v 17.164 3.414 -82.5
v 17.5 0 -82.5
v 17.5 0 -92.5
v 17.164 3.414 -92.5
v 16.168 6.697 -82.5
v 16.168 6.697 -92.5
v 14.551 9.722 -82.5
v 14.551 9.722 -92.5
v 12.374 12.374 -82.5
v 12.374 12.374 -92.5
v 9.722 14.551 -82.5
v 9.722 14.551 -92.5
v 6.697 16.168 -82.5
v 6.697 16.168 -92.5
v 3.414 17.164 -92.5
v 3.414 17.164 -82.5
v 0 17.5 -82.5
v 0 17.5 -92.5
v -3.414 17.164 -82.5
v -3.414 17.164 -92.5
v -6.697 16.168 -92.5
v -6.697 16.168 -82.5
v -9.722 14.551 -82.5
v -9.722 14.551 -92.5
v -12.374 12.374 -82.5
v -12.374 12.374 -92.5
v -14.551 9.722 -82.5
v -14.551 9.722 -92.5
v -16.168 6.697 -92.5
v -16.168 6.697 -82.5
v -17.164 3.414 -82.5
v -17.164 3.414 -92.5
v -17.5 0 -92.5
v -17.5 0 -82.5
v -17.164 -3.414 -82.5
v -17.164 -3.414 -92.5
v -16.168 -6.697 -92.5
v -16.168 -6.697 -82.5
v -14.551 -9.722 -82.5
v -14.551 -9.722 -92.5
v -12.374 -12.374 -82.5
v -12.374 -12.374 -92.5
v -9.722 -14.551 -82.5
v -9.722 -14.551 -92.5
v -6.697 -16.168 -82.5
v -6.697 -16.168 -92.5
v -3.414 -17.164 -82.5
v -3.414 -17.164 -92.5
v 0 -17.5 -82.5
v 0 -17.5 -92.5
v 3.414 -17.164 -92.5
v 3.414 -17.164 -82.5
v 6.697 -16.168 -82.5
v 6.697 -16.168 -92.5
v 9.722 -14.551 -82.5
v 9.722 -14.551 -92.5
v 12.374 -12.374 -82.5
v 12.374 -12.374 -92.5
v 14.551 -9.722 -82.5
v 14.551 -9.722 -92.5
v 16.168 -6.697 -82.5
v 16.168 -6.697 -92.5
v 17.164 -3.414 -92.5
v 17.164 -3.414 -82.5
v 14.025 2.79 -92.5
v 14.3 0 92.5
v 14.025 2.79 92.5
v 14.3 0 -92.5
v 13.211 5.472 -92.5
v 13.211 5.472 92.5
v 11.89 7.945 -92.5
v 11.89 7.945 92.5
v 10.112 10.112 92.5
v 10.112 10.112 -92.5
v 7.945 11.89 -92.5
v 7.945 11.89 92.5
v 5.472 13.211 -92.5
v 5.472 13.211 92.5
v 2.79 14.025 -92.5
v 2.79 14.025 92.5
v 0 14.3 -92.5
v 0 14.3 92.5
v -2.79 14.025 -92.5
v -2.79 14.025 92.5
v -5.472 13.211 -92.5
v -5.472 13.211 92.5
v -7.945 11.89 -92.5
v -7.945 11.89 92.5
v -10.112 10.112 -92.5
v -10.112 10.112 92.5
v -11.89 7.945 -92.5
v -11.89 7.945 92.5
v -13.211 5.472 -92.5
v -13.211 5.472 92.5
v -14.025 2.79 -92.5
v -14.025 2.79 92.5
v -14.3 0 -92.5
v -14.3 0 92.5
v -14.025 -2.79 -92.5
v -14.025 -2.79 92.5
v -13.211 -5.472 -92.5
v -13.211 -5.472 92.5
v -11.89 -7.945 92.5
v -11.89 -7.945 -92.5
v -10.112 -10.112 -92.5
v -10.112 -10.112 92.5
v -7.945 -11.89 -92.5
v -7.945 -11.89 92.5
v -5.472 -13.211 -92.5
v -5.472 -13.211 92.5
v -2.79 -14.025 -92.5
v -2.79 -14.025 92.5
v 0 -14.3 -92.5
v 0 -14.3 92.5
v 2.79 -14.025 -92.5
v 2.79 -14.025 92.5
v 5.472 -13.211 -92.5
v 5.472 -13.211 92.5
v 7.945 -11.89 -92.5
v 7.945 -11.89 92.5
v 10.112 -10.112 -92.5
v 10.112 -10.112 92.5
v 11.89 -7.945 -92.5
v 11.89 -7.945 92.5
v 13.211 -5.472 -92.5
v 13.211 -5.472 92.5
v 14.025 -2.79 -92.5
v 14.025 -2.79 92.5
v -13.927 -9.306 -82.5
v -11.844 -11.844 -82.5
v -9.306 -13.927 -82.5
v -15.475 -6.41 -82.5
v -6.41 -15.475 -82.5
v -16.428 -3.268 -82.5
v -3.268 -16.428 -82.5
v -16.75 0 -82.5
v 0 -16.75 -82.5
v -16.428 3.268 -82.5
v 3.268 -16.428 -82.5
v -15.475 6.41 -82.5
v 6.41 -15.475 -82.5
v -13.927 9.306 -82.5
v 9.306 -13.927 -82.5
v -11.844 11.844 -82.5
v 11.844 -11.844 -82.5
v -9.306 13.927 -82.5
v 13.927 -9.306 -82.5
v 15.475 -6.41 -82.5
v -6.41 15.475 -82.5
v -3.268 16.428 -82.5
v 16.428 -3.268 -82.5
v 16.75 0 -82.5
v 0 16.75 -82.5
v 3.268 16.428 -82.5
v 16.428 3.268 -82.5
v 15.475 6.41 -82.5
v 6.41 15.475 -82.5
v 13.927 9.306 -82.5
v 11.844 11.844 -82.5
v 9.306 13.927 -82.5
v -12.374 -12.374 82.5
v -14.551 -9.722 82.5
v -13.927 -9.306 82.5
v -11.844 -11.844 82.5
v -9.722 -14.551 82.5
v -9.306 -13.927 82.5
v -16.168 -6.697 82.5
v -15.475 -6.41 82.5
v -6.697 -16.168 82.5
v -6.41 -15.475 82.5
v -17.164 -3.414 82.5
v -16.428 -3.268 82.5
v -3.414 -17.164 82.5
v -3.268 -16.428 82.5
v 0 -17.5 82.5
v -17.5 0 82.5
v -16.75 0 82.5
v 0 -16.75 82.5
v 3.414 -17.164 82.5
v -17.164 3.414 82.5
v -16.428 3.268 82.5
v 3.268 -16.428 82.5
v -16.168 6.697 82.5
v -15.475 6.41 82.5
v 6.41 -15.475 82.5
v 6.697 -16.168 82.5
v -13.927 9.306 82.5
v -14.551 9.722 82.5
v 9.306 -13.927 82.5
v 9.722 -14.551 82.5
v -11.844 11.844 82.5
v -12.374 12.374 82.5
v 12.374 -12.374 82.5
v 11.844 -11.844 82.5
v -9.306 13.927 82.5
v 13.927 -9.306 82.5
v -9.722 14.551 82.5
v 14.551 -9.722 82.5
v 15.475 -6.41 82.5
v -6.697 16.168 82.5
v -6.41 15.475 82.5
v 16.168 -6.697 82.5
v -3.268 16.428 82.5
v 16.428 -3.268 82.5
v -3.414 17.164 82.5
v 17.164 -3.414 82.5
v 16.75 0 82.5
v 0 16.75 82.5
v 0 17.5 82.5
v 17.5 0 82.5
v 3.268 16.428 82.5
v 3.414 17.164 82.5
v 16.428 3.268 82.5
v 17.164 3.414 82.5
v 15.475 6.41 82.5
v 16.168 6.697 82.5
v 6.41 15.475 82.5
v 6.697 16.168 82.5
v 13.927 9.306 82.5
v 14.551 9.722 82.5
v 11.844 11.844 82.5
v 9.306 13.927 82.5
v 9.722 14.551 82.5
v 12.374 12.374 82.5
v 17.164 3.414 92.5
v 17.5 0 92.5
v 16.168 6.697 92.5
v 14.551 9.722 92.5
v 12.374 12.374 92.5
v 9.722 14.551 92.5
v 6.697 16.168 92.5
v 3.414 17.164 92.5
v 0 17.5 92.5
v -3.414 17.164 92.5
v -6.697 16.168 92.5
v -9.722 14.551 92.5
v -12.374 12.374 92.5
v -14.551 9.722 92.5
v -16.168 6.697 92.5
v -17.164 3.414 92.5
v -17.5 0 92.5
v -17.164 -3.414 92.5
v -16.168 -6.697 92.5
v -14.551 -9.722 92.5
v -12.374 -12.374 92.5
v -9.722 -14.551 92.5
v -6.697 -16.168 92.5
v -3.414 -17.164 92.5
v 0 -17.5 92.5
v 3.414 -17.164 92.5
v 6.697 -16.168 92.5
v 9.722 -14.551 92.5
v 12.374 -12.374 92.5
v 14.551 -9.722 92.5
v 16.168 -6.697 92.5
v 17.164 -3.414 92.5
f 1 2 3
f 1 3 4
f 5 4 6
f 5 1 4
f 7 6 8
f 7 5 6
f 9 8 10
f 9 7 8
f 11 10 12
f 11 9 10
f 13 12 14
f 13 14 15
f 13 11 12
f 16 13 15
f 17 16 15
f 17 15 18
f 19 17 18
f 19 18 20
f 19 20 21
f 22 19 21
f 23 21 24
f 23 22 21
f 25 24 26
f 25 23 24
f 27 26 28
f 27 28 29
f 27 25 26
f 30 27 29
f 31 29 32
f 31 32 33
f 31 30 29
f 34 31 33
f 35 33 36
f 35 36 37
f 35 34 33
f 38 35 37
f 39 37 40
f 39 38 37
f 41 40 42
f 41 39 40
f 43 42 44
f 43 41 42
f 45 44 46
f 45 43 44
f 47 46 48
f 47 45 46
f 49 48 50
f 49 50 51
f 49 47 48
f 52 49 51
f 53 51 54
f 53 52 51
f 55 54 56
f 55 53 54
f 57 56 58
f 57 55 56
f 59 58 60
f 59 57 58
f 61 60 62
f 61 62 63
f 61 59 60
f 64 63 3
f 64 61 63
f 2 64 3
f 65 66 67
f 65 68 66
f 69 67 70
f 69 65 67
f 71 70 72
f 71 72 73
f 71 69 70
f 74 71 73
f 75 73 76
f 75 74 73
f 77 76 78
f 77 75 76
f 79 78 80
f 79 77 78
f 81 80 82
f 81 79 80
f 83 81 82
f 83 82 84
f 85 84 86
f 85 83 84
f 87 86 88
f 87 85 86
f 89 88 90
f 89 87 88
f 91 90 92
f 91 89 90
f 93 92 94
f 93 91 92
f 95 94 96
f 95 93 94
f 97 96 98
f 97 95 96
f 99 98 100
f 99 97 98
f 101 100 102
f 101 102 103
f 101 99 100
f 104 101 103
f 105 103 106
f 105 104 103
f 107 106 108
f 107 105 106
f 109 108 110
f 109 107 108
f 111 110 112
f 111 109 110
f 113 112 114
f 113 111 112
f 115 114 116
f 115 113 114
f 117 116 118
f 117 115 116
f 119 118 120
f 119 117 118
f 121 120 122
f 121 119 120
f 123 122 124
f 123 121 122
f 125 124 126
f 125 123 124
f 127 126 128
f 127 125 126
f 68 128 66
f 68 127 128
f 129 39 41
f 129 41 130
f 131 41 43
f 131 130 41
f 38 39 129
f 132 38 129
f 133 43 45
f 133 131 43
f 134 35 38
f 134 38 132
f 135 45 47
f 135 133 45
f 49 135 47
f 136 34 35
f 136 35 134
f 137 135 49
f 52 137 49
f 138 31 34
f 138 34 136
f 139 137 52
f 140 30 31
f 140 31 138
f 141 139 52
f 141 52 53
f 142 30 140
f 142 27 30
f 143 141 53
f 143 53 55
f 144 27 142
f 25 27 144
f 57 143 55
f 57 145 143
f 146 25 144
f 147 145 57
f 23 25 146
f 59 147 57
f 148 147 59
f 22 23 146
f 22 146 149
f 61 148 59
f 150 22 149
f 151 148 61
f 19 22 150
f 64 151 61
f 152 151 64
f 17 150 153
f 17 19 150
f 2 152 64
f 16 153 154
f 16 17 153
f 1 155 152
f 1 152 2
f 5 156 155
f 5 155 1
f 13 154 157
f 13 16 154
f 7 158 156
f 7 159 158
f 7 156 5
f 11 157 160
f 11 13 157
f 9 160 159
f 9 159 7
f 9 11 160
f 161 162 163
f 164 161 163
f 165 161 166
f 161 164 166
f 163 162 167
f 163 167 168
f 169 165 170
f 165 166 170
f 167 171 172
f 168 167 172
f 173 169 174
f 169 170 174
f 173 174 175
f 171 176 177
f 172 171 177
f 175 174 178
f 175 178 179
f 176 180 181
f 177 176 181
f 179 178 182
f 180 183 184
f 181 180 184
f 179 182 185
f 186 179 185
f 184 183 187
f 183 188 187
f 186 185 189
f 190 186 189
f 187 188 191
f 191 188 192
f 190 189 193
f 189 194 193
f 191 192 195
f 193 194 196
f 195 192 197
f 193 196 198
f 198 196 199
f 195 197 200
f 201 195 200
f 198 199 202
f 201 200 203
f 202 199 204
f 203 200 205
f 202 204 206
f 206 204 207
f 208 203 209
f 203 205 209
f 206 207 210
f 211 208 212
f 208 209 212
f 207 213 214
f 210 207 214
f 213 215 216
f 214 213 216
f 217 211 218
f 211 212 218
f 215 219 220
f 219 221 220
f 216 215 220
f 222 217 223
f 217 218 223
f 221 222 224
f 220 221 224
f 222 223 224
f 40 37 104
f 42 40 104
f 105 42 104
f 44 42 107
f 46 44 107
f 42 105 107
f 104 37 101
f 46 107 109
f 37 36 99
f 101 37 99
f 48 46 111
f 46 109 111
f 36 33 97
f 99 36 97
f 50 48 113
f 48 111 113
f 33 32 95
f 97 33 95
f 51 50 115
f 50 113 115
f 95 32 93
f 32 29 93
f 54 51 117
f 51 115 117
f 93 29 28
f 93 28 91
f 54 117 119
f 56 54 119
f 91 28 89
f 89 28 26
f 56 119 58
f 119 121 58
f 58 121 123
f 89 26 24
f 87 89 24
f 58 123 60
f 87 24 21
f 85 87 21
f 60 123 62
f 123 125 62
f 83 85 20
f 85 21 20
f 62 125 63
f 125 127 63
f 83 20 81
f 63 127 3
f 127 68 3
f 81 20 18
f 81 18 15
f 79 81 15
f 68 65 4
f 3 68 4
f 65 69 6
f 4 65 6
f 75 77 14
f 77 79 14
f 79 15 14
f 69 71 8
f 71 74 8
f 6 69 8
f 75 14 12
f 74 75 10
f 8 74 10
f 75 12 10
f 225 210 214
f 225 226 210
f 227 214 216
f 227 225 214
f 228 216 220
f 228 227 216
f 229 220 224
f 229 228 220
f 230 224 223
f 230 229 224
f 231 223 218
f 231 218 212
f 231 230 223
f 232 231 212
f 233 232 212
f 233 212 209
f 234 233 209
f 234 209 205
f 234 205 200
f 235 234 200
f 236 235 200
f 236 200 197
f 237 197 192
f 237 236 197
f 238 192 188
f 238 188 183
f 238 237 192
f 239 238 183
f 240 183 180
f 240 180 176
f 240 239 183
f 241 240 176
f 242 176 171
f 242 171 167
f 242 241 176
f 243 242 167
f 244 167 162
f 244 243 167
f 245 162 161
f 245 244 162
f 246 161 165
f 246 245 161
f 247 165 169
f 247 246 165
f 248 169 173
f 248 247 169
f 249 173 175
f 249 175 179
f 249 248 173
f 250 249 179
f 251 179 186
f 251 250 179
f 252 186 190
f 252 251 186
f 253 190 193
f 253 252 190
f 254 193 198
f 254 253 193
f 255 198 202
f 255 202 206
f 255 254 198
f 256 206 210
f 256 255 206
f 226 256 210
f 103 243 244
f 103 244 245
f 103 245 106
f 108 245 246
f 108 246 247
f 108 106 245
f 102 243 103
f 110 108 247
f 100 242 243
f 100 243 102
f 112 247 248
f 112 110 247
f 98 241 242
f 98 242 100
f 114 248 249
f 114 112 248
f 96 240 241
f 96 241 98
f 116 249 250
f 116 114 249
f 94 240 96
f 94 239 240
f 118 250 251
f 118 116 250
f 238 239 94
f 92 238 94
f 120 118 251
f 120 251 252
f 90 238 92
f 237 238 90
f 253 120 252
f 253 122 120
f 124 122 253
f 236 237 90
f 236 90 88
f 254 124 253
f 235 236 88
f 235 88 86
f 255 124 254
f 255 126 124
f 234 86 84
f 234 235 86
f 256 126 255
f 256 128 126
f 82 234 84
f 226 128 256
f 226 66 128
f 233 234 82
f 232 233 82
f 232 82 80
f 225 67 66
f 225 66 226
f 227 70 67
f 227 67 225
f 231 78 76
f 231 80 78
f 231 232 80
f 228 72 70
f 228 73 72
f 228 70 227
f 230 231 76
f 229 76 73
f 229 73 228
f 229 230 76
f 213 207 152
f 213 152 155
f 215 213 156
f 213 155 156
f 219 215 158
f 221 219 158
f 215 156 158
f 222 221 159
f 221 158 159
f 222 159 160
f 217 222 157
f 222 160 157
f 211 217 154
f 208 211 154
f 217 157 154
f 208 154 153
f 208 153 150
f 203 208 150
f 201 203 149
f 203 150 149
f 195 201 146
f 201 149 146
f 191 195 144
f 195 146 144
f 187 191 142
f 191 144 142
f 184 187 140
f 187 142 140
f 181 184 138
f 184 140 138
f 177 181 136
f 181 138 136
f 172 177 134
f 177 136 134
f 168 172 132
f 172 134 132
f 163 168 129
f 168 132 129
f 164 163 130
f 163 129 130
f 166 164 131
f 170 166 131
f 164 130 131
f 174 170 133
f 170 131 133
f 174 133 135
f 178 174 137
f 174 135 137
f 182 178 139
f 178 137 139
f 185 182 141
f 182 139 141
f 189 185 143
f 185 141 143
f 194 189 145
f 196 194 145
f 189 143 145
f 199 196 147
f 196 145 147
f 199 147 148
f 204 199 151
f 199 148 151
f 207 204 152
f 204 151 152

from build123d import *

# Parameters (mm, degrees)
ESQUISSE1_R             = 17.5
ESQUISSE1_R_2           = 14.3
BOSS_EXTRU_1_DEPTH      = 92.5
ESQUISSE2_OUTSIDE_W     = 75.302
ESQUISSE2_OUTSIDE_H     = 75.302
ESQUISSE2_OUTSIDE_R     = 16.75
ENL_V_MAT_EXTRU_1_DEPTH = 82.5


with BuildPart() as part:
    # Esquisse1 → Boss.-Extru.1 (new, symmetric)
    with BuildSketch(Plane.XY):
        Circle(ESQUISSE1_R)
        Circle(ESQUISSE1_R_2, mode=Mode.SUBTRACT)
    extrude(amount=BOSS_EXTRU_1_DEPTH, both=True)

    # Esquisse2 outside → Enlèv. mat.-Extru.1 (cut, symmetric)
    with BuildSketch(Plane.XY):
        Rectangle(ESQUISSE2_OUTSIDE_W, ESQUISSE2_OUTSIDE_H)
        Circle(ESQUISSE2_OUTSIDE_R, mode=Mode.SUBTRACT)
    extrude(amount=ENL_V_MAT_EXTRU_1_DEPTH, both=True, mode=Mode.SUBTRACT)


solid = part.part
